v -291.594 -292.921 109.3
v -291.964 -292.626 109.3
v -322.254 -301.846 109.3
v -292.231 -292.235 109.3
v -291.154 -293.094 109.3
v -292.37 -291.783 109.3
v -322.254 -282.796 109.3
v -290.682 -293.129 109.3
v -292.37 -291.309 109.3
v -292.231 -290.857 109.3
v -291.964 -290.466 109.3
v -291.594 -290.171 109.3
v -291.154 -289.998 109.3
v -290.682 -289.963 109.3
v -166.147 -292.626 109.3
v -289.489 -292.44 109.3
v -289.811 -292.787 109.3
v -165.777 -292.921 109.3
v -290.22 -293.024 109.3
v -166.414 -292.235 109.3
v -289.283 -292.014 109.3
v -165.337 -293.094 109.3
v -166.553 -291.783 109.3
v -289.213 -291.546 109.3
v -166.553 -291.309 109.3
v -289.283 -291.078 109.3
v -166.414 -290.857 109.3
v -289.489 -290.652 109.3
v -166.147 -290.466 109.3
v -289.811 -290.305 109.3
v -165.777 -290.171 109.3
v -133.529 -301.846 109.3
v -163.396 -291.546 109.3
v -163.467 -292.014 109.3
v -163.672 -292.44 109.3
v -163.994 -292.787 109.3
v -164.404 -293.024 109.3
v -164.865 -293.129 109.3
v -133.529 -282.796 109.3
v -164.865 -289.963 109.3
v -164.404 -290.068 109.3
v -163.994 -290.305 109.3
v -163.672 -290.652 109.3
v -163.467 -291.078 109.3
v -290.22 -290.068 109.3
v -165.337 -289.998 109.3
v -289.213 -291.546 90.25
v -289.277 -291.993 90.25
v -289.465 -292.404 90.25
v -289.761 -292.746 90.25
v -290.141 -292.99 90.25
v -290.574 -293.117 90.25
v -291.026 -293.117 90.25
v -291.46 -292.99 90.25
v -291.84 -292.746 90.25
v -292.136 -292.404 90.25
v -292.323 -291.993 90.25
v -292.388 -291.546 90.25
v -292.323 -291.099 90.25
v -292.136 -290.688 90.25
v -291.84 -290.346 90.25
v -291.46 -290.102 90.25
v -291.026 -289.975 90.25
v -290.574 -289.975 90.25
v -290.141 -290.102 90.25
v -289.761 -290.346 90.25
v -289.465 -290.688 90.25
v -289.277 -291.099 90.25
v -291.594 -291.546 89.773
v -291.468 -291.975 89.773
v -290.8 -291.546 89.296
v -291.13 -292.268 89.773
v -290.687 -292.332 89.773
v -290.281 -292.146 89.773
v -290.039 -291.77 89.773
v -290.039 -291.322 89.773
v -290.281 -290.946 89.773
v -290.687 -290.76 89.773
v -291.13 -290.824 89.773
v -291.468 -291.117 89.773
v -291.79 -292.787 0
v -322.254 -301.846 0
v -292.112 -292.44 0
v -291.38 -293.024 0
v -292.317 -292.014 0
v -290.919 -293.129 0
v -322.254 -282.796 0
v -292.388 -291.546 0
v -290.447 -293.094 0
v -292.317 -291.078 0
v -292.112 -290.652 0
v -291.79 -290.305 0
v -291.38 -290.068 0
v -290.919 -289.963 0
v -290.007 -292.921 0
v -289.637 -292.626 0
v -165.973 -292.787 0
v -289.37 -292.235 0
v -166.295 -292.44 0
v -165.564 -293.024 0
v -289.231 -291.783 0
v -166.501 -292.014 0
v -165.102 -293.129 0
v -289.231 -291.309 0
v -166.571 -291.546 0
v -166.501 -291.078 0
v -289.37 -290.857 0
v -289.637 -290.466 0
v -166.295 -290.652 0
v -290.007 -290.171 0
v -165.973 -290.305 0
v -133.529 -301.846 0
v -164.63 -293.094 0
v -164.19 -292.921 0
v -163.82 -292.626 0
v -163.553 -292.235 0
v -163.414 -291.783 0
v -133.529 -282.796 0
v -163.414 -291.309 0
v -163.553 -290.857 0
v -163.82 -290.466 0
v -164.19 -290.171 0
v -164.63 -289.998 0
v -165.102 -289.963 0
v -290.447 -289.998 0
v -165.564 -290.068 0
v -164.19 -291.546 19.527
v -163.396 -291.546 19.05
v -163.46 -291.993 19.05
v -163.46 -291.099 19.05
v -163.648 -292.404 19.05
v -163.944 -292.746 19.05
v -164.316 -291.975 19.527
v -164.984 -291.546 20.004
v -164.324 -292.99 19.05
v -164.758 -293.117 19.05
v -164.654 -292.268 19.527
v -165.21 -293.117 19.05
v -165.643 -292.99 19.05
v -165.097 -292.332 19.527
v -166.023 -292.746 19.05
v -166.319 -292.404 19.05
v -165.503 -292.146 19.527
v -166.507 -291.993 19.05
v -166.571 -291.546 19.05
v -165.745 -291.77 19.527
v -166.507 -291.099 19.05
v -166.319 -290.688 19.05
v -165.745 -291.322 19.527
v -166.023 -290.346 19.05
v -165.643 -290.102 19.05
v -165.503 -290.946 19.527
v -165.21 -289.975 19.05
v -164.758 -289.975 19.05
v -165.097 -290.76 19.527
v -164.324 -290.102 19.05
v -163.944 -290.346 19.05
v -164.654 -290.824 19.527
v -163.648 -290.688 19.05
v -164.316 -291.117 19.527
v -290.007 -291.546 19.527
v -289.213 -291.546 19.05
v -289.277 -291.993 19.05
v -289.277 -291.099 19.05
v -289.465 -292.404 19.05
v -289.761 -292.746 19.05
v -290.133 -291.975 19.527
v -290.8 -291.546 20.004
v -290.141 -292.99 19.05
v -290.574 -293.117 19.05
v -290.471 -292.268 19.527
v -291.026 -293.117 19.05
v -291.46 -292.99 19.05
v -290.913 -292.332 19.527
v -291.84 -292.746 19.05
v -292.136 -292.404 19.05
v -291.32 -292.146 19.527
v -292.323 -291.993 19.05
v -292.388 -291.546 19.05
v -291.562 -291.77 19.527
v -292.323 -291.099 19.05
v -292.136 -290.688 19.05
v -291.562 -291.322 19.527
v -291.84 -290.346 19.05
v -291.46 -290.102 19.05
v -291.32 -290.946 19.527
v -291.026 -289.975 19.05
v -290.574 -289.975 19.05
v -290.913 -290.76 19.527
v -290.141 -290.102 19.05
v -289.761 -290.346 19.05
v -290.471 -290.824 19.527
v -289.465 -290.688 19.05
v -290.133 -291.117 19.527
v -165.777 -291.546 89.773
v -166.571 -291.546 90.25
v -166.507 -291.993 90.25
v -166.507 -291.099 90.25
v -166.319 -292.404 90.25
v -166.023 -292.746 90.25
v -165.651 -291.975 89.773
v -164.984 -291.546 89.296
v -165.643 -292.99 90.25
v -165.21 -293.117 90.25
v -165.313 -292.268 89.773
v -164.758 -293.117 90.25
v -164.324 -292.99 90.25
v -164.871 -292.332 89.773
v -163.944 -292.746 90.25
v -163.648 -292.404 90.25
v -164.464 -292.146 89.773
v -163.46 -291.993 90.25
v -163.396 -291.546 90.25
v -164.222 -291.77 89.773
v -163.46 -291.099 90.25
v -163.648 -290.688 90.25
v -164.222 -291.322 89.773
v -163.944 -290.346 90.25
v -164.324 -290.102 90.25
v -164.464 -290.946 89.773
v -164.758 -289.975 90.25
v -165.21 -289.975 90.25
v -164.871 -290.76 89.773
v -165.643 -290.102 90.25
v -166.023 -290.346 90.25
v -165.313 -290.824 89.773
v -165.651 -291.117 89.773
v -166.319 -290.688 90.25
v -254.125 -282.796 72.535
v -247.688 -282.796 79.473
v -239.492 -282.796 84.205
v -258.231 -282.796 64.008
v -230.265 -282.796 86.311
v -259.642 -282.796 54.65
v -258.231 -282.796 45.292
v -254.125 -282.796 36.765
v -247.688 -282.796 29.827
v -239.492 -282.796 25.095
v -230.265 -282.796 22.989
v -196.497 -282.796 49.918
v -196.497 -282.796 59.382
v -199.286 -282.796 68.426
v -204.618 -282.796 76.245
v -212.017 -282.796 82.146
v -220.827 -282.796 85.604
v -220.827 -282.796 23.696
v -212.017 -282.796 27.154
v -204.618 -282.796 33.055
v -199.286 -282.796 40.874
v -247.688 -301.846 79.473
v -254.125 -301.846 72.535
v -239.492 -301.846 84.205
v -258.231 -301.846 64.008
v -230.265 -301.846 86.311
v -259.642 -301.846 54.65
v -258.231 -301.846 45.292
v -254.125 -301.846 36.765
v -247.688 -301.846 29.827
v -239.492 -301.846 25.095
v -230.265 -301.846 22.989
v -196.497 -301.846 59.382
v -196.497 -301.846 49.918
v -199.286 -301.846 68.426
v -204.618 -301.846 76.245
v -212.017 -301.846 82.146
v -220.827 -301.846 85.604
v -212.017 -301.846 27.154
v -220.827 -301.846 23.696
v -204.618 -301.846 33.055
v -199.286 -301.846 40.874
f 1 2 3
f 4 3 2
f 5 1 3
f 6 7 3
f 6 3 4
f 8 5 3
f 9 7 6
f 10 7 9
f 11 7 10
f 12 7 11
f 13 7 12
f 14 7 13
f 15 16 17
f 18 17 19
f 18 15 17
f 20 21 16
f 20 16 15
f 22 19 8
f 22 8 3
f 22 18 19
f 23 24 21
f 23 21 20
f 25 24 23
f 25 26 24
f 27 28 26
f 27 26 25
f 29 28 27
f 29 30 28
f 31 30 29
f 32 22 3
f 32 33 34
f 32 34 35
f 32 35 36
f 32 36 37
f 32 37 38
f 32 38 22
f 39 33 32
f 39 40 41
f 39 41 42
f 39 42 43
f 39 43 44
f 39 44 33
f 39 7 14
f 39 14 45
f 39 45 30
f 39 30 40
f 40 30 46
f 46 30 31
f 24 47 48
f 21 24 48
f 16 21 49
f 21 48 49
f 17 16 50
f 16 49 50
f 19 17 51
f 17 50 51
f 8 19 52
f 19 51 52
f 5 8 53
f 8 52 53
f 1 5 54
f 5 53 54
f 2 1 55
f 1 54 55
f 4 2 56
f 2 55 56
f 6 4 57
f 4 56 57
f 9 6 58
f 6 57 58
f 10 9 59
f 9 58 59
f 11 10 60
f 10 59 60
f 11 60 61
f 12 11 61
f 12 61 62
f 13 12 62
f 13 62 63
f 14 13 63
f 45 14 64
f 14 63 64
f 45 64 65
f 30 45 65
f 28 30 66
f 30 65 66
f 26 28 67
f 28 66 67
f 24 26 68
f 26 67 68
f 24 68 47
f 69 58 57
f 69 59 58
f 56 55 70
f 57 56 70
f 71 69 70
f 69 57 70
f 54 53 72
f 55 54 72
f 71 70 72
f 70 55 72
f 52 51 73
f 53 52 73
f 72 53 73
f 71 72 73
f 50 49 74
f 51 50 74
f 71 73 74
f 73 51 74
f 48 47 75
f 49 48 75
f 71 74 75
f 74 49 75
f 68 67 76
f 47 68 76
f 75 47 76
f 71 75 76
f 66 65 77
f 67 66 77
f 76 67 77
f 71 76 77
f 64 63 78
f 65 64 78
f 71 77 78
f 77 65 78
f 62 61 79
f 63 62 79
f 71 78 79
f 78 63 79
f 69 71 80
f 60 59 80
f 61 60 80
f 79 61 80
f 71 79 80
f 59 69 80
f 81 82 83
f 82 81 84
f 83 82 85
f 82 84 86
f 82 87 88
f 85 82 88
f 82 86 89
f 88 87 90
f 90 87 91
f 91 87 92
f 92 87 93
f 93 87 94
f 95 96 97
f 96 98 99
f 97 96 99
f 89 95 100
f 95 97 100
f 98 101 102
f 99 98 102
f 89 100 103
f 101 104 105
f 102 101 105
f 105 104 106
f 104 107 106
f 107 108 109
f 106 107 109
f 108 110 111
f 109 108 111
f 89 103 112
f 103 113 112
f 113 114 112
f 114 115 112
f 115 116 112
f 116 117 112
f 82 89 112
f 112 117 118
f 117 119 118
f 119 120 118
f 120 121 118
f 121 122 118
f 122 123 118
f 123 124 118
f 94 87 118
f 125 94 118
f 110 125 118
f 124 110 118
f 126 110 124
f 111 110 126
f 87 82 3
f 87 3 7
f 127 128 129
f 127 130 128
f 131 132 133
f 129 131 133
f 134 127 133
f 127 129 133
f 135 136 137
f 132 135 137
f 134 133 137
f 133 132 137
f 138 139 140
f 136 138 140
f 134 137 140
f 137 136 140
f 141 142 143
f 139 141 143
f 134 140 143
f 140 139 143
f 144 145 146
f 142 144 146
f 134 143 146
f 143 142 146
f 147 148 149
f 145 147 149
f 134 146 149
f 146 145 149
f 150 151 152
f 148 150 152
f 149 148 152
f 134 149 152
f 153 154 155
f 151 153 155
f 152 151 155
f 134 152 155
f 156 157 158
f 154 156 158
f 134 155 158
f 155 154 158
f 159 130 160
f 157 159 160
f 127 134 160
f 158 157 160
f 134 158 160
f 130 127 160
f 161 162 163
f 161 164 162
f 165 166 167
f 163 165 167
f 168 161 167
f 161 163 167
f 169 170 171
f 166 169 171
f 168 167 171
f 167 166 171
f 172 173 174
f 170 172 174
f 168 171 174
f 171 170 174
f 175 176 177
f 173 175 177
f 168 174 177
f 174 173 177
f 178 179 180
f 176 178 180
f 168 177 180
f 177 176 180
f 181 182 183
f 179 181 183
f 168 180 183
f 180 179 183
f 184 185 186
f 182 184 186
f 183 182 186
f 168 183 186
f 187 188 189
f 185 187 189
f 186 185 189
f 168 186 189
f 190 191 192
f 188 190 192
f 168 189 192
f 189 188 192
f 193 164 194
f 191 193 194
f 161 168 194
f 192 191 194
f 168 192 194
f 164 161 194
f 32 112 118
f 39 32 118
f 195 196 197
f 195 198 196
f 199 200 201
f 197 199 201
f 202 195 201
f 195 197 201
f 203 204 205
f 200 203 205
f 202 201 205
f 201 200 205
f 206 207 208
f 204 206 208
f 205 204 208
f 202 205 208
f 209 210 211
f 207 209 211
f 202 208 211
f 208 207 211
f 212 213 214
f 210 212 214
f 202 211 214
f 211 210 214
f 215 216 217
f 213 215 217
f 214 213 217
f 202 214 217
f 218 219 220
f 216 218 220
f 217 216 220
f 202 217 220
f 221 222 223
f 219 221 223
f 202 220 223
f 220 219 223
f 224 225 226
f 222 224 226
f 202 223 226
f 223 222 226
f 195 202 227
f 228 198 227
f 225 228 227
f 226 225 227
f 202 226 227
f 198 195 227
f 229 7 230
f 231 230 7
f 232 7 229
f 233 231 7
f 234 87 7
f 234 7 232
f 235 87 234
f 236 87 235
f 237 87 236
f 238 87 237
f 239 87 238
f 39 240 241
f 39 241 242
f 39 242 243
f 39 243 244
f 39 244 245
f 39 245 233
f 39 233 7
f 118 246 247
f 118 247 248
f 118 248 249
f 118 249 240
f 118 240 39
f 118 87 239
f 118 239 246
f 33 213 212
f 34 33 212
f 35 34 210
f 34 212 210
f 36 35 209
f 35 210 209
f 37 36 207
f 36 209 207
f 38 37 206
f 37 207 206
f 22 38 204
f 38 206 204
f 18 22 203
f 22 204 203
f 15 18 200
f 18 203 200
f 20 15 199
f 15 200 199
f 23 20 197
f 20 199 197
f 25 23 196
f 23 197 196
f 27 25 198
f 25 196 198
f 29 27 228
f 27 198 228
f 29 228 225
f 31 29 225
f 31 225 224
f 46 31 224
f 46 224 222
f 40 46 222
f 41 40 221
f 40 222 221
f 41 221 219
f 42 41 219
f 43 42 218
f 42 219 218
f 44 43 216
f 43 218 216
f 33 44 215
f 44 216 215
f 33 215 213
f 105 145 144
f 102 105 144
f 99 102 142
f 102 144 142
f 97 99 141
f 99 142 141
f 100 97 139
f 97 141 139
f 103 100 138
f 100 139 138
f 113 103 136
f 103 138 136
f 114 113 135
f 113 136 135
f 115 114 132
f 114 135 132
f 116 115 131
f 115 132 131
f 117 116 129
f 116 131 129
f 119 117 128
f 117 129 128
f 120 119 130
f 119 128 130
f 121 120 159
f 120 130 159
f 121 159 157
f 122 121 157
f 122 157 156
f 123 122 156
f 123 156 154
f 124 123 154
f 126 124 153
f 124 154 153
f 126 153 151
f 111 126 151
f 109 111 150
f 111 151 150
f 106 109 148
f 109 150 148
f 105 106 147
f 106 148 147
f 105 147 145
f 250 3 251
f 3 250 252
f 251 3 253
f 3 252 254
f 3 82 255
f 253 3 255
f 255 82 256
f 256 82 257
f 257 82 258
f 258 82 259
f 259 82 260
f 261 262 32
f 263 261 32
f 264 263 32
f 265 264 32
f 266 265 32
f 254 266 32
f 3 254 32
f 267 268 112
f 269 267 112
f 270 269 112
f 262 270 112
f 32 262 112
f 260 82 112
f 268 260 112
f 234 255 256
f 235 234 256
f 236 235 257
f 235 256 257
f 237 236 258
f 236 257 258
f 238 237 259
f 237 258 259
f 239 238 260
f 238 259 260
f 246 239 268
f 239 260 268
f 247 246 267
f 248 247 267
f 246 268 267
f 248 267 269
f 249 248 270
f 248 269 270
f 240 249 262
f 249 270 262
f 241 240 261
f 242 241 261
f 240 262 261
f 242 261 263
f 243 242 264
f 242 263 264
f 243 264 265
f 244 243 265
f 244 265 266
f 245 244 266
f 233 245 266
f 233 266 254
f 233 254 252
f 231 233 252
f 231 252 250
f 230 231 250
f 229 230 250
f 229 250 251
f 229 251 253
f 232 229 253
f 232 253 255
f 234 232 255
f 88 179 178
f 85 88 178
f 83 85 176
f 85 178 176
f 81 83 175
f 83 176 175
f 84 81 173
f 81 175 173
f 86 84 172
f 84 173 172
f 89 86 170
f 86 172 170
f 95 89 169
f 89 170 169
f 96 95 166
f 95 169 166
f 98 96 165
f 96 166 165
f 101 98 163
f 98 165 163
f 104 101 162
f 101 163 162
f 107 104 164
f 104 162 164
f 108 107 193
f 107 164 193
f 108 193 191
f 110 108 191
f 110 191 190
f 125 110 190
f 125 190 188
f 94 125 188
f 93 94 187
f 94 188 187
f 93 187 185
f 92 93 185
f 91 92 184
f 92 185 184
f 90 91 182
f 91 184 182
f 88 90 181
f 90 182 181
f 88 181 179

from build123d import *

# Parameters (mm, degrees)
SKETCH1_W           = 188.724999994
SKETCH1_H           = 19.05
BOSS_EXTRUDE1_DEPTH = 109.3
HOLE1_D             = 3.175
HOLE1_DEPTH         = 31.75
HOLE1_CSINK_D       = 10.16
HOLE1_CSINK_ANGLE   = 82
HOLE1_TIP           = 0.953866233
HOLE2_D             = 3.175
HOLE2_DEPTH         = 31.75
HOLE2_CSINK_D       = 10.16
HOLE2_CSINK_ANGLE   = 82
HOLE2_TIP           = 0.953866233
HOLE3_D             = 3.175
HOLE3_DEPTH         = 31.75
HOLE3_CSINK_D       = 10.16
HOLE3_CSINK_ANGLE   = 82
HOLE3_TIP           = 0.953866233
HOLE4_D             = 63.5
HOLE4_DEPTH         = 19.05


with BuildPart() as part:
    # Sketch1 → Boss-Extrude1 (new body)
    with BuildSketch(Plane.XY):
        with Locations((-227.891965966, -292.321060846)):
            Rectangle(SKETCH1_W, SKETCH1_H)
    extrude(amount=BOSS_EXTRUDE1_DEPTH)

    # Hole1
    with Locations(Plane(origin=(-124.004465969, 10.424290059, -12.7), x_dir=(1, 0, 0), z_dir=(0, 0, -1))):
        with Locations((113.649999994, 128.807623392), (113.649999994, 23.940956725), (-94.599999994, 161.374290059), (94.599999994, 161.374290059), (0, 161.374290059), (0, 193.124290059), (0, 440.553783621), (0, 301.970350905), (40.979166666, 301.970350905), (166.795833328, 301.970350905), (207.774999994, 440.553783621), (207.774999994, 333.02141023), (207.774999994, 225.48903684), (207.774999994, 137.424290059), (207.774999994, 10.424290059), (-207.774999994, 10.424290059), (-207.774999994, 137.424290059), (-207.774999994, 225.48903684), (-207.774999994, 333.02141023), (-207.774999994, 440.553783621), (-166.795833328, 301.970350905), (-40.979166666, 301.970350905), (-113.649999994, 23.940956725), (-113.649999994, 128.807623392)):
            CounterSinkHole(HOLE1_D / 2, HOLE1_CSINK_D / 2, depth=HOLE1_DEPTH, counter_sink_angle=HOLE1_CSINK_ANGLE)
            with Locations((0, 0, -(HOLE1_DEPTH + HOLE1_TIP / 2))):  # 118° drill point
                Cone(0, HOLE1_D / 2, HOLE1_TIP, mode=Mode.SUBTRACT)

    # Hole2
    with Locations(Plane(origin=(-124.004465969, 10.424290059, 122), x_dir=(-1, 0, 0), z_dir=(0, 0, 1))):
        with Locations((113.649999994, 128.807623392), (113.649999994, 23.940956725), (-94.599999994, 161.374290059), (94.599999994, 161.374290059), (0, 161.374290059), (0, 193.124290059), (0, 440.553783621), (0, 301.970350905), (40.979166666, 301.970350905), (166.795833328, 301.970350905), (207.774999994, 440.553783621), (207.774999994, 333.02141023), (207.774999994, 225.48903684), (207.774999994, 137.424290059), (207.774999994, 10.424290059), (-207.774999994, 10.424290059), (-207.774999994, 137.424290059), (-207.774999994, 225.48903684), (-207.774999994, 333.02141023), (-207.774999994, 440.553783621), (-166.795833328, 301.970350905), (-40.979166666, 301.970350905), (-113.649999994, 23.940956725), (-113.649999994, 128.807623392)):
            CounterSinkHole(HOLE2_D / 2, HOLE2_CSINK_D / 2, depth=HOLE2_DEPTH, counter_sink_angle=HOLE2_CSINK_ANGLE)
            with Locations((0, 0, -(HOLE2_DEPTH + HOLE2_TIP / 2))):  # 118° drill point
                Cone(0, HOLE2_D / 2, HOLE2_TIP, mode=Mode.SUBTRACT)

    # Hole3
    with Locations(Plane(origin=(-124.004465969, 10.424290059, 122), x_dir=(-1, 0, 0), z_dir=(0, 0, 1))):
        with Locations((-207.774999994, 333.02141023), (-207.774999994, 225.48903684), (-207.774999994, 137.424290059), (-172.166666661, 4.074290059), (-146.083333327, 4.074290059), (-94.599999994, 161.374290059), (0, 161.374290059), (94.599999994, 161.374290059), (146.083333327, 4.074290059), (172.166666661, 4.074290059), (207.774999994, 137.424290059), (207.774999994, 225.48903684), (207.774999994, 333.02141023), (166.795833328, 301.970350905), (40.979166666, 301.970350905), (-40.979166666, 301.970350905), (-166.795833328, 301.970350905), (0, 193.124290059), (0, 301.970350905), (0, 412.366411751), (-126.349999994, 106.824290059), (-126.349999994, 58.624290059), (126.349999994, 58.624290059), (126.349999994, 106.824290059)):
            CounterSinkHole(HOLE3_D / 2, HOLE3_CSINK_D / 2, depth=HOLE3_DEPTH, counter_sink_angle=HOLE3_CSINK_ANGLE)
            with Locations((0, 0, -(HOLE3_DEPTH + HOLE3_TIP / 2))):  # 118° drill point
                Cone(0, HOLE3_D / 2, HOLE3_TIP, mode=Mode.SUBTRACT)

    # Hole4
    with Locations(Plane(origin=(0, -282.796060846, 0), x_dir=(1, 0, 0), z_dir=(0, 1, 0))):
        with Locations((-227.891965966, -54.65)):
            Hole(HOLE4_D / 2, depth=HOLE4_DEPTH)


solid = part.part
